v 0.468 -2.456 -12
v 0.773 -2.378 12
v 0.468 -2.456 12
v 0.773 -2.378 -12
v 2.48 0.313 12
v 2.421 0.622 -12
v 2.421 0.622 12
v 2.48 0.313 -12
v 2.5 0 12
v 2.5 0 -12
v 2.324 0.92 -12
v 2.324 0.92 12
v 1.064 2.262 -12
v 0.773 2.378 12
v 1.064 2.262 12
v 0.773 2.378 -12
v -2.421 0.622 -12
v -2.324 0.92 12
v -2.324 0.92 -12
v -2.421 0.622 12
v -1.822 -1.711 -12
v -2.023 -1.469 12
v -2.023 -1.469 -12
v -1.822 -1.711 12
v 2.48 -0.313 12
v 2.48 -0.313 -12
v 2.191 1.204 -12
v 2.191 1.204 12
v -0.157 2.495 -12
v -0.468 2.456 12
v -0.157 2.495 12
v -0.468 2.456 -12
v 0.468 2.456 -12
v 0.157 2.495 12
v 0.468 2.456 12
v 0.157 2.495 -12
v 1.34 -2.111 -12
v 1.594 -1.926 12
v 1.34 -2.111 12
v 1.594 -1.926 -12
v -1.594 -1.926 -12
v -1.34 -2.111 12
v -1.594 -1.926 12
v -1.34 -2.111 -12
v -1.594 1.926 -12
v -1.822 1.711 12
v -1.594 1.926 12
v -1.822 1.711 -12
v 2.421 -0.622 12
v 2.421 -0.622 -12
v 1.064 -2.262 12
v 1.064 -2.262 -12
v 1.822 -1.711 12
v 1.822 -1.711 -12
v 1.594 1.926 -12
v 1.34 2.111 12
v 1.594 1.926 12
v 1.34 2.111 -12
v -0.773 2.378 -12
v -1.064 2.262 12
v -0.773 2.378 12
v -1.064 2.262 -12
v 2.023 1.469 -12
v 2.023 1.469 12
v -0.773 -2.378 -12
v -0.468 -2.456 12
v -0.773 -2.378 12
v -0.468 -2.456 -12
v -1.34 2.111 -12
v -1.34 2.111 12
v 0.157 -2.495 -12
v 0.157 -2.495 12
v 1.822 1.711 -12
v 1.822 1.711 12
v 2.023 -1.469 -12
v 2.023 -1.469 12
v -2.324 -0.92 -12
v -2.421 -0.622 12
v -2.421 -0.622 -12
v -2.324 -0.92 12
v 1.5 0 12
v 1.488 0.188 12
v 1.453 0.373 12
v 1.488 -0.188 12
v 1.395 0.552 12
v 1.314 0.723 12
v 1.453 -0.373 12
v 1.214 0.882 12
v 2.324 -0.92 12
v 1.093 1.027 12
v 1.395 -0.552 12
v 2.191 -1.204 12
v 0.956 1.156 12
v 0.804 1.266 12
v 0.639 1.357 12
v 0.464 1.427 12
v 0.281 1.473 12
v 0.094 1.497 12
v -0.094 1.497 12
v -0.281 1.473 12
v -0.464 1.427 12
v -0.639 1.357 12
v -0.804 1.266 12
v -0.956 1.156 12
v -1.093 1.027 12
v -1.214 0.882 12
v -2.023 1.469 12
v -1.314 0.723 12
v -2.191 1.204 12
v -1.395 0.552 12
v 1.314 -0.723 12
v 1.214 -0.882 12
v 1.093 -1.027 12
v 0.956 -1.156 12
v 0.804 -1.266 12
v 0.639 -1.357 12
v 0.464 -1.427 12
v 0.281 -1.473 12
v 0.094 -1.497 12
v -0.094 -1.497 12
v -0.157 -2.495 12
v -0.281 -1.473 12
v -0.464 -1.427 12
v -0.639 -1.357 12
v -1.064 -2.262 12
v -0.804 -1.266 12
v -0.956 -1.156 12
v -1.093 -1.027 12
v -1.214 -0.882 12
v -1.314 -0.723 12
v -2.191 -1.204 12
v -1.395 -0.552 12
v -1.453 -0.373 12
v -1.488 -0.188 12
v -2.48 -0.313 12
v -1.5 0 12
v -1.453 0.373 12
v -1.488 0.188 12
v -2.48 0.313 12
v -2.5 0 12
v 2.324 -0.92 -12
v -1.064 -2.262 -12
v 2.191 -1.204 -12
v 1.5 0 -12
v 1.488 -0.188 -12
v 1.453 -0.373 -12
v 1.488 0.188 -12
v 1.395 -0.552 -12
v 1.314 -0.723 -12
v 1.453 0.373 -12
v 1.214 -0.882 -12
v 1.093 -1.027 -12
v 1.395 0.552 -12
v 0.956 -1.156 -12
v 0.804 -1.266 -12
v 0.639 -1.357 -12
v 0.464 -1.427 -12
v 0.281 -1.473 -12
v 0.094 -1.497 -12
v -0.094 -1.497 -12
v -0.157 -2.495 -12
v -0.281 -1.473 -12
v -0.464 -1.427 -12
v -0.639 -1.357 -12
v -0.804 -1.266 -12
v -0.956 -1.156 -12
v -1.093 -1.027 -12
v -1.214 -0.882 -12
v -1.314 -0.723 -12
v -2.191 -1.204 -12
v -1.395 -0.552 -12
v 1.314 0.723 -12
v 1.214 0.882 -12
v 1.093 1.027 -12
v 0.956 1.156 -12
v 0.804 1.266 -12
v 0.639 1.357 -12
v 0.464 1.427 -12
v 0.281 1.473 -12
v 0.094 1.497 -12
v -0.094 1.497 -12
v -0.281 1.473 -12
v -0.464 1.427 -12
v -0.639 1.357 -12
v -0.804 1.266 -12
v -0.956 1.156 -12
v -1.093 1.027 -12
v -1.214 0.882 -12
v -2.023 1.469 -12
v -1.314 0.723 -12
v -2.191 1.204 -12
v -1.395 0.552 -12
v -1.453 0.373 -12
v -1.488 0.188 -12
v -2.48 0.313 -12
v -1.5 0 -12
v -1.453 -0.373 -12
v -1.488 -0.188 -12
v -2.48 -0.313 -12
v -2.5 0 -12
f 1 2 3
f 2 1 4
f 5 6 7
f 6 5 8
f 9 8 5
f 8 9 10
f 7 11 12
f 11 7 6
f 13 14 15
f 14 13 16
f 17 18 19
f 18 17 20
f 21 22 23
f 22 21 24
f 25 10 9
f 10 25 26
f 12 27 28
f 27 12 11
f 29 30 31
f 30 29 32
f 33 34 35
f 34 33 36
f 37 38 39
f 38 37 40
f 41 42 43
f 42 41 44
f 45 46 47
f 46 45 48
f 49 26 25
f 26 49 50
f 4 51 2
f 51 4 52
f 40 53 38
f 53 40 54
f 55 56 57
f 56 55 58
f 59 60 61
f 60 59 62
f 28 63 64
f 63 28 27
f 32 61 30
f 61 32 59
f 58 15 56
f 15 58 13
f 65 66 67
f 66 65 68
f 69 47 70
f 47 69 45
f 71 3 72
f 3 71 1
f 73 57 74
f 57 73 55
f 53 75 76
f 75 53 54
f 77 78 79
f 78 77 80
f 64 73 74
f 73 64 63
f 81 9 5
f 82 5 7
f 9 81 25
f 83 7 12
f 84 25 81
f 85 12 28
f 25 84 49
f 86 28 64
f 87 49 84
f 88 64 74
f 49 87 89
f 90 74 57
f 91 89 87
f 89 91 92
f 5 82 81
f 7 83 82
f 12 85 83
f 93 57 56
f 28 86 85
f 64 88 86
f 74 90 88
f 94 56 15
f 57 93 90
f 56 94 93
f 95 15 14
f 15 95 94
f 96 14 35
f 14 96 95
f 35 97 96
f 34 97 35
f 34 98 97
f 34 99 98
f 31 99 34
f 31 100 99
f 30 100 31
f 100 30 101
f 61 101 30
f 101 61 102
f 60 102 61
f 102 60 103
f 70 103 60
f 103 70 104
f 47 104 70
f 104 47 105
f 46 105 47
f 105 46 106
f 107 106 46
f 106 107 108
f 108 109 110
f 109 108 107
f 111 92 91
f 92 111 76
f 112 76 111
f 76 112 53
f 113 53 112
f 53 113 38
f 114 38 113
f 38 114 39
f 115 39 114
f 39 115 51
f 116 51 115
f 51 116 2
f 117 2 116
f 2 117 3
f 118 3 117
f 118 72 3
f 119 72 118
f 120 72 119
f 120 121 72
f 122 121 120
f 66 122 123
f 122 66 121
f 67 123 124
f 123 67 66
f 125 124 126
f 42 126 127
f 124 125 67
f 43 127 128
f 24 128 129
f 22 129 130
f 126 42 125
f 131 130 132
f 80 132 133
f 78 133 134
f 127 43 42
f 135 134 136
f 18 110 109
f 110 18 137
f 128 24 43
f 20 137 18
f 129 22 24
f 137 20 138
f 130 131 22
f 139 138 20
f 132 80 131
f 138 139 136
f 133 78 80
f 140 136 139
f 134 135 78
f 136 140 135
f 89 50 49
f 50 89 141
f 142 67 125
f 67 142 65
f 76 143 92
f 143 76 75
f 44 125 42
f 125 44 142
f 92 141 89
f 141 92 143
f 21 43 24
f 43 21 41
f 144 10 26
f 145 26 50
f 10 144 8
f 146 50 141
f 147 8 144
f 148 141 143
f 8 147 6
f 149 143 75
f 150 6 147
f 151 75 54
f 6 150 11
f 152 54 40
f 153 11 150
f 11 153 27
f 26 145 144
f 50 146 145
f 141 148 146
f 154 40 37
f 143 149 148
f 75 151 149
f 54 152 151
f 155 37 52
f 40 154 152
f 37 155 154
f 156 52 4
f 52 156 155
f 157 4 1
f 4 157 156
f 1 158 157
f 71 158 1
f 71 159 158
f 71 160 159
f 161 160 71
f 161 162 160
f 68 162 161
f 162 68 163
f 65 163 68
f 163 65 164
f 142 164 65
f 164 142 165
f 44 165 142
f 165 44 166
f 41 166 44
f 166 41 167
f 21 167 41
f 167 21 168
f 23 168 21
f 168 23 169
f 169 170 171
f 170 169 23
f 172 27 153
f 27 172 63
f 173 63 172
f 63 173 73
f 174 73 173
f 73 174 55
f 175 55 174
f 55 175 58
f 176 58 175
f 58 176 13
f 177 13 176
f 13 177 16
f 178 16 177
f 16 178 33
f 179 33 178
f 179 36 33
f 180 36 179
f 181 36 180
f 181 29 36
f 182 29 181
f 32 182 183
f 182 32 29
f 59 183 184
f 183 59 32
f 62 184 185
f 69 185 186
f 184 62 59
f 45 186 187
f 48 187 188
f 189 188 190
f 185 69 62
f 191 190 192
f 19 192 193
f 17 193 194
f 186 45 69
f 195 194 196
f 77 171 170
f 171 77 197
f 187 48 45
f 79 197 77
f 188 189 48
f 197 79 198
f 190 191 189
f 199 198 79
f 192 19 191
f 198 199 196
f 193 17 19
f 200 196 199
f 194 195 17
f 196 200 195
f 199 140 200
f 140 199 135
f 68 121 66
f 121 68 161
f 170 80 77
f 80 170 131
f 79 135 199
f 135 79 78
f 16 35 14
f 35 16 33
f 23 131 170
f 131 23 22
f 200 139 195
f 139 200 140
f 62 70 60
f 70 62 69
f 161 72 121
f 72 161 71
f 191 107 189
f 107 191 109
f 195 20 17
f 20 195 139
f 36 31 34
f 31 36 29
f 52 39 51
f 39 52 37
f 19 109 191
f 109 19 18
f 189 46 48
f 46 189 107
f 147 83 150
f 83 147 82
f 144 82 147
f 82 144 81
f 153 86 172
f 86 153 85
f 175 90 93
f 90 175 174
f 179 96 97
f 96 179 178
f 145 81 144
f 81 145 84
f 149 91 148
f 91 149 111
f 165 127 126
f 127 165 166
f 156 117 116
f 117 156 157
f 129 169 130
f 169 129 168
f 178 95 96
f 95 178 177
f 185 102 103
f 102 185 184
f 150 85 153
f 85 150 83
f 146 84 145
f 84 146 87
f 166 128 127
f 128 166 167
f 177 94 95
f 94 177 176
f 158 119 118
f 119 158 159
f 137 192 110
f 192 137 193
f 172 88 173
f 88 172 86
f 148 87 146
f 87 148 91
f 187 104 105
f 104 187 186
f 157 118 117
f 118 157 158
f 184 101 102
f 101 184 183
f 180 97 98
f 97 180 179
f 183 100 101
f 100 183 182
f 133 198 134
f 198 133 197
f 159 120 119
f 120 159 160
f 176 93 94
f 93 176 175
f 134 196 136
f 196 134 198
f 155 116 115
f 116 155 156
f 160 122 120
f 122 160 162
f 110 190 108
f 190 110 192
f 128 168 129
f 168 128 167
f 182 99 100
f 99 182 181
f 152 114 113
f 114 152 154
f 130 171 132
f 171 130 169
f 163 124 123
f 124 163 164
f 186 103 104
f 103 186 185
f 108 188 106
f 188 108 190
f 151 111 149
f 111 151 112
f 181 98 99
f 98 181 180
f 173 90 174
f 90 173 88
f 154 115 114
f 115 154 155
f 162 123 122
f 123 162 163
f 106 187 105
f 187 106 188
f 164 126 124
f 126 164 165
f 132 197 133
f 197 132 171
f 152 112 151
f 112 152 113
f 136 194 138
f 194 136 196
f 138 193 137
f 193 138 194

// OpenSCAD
$fn = 50;


difference() {
	union() {
		translate(v = [0, 0, -12.0000000000]) {
			cylinder(h = 24, r = 2.5000000000);
		}
	}
	union() {
		translate(v = [0, 0, -100.0000000000]) {
			cylinder(h = 200, r = 1.5000000000);
		}
	}
}
